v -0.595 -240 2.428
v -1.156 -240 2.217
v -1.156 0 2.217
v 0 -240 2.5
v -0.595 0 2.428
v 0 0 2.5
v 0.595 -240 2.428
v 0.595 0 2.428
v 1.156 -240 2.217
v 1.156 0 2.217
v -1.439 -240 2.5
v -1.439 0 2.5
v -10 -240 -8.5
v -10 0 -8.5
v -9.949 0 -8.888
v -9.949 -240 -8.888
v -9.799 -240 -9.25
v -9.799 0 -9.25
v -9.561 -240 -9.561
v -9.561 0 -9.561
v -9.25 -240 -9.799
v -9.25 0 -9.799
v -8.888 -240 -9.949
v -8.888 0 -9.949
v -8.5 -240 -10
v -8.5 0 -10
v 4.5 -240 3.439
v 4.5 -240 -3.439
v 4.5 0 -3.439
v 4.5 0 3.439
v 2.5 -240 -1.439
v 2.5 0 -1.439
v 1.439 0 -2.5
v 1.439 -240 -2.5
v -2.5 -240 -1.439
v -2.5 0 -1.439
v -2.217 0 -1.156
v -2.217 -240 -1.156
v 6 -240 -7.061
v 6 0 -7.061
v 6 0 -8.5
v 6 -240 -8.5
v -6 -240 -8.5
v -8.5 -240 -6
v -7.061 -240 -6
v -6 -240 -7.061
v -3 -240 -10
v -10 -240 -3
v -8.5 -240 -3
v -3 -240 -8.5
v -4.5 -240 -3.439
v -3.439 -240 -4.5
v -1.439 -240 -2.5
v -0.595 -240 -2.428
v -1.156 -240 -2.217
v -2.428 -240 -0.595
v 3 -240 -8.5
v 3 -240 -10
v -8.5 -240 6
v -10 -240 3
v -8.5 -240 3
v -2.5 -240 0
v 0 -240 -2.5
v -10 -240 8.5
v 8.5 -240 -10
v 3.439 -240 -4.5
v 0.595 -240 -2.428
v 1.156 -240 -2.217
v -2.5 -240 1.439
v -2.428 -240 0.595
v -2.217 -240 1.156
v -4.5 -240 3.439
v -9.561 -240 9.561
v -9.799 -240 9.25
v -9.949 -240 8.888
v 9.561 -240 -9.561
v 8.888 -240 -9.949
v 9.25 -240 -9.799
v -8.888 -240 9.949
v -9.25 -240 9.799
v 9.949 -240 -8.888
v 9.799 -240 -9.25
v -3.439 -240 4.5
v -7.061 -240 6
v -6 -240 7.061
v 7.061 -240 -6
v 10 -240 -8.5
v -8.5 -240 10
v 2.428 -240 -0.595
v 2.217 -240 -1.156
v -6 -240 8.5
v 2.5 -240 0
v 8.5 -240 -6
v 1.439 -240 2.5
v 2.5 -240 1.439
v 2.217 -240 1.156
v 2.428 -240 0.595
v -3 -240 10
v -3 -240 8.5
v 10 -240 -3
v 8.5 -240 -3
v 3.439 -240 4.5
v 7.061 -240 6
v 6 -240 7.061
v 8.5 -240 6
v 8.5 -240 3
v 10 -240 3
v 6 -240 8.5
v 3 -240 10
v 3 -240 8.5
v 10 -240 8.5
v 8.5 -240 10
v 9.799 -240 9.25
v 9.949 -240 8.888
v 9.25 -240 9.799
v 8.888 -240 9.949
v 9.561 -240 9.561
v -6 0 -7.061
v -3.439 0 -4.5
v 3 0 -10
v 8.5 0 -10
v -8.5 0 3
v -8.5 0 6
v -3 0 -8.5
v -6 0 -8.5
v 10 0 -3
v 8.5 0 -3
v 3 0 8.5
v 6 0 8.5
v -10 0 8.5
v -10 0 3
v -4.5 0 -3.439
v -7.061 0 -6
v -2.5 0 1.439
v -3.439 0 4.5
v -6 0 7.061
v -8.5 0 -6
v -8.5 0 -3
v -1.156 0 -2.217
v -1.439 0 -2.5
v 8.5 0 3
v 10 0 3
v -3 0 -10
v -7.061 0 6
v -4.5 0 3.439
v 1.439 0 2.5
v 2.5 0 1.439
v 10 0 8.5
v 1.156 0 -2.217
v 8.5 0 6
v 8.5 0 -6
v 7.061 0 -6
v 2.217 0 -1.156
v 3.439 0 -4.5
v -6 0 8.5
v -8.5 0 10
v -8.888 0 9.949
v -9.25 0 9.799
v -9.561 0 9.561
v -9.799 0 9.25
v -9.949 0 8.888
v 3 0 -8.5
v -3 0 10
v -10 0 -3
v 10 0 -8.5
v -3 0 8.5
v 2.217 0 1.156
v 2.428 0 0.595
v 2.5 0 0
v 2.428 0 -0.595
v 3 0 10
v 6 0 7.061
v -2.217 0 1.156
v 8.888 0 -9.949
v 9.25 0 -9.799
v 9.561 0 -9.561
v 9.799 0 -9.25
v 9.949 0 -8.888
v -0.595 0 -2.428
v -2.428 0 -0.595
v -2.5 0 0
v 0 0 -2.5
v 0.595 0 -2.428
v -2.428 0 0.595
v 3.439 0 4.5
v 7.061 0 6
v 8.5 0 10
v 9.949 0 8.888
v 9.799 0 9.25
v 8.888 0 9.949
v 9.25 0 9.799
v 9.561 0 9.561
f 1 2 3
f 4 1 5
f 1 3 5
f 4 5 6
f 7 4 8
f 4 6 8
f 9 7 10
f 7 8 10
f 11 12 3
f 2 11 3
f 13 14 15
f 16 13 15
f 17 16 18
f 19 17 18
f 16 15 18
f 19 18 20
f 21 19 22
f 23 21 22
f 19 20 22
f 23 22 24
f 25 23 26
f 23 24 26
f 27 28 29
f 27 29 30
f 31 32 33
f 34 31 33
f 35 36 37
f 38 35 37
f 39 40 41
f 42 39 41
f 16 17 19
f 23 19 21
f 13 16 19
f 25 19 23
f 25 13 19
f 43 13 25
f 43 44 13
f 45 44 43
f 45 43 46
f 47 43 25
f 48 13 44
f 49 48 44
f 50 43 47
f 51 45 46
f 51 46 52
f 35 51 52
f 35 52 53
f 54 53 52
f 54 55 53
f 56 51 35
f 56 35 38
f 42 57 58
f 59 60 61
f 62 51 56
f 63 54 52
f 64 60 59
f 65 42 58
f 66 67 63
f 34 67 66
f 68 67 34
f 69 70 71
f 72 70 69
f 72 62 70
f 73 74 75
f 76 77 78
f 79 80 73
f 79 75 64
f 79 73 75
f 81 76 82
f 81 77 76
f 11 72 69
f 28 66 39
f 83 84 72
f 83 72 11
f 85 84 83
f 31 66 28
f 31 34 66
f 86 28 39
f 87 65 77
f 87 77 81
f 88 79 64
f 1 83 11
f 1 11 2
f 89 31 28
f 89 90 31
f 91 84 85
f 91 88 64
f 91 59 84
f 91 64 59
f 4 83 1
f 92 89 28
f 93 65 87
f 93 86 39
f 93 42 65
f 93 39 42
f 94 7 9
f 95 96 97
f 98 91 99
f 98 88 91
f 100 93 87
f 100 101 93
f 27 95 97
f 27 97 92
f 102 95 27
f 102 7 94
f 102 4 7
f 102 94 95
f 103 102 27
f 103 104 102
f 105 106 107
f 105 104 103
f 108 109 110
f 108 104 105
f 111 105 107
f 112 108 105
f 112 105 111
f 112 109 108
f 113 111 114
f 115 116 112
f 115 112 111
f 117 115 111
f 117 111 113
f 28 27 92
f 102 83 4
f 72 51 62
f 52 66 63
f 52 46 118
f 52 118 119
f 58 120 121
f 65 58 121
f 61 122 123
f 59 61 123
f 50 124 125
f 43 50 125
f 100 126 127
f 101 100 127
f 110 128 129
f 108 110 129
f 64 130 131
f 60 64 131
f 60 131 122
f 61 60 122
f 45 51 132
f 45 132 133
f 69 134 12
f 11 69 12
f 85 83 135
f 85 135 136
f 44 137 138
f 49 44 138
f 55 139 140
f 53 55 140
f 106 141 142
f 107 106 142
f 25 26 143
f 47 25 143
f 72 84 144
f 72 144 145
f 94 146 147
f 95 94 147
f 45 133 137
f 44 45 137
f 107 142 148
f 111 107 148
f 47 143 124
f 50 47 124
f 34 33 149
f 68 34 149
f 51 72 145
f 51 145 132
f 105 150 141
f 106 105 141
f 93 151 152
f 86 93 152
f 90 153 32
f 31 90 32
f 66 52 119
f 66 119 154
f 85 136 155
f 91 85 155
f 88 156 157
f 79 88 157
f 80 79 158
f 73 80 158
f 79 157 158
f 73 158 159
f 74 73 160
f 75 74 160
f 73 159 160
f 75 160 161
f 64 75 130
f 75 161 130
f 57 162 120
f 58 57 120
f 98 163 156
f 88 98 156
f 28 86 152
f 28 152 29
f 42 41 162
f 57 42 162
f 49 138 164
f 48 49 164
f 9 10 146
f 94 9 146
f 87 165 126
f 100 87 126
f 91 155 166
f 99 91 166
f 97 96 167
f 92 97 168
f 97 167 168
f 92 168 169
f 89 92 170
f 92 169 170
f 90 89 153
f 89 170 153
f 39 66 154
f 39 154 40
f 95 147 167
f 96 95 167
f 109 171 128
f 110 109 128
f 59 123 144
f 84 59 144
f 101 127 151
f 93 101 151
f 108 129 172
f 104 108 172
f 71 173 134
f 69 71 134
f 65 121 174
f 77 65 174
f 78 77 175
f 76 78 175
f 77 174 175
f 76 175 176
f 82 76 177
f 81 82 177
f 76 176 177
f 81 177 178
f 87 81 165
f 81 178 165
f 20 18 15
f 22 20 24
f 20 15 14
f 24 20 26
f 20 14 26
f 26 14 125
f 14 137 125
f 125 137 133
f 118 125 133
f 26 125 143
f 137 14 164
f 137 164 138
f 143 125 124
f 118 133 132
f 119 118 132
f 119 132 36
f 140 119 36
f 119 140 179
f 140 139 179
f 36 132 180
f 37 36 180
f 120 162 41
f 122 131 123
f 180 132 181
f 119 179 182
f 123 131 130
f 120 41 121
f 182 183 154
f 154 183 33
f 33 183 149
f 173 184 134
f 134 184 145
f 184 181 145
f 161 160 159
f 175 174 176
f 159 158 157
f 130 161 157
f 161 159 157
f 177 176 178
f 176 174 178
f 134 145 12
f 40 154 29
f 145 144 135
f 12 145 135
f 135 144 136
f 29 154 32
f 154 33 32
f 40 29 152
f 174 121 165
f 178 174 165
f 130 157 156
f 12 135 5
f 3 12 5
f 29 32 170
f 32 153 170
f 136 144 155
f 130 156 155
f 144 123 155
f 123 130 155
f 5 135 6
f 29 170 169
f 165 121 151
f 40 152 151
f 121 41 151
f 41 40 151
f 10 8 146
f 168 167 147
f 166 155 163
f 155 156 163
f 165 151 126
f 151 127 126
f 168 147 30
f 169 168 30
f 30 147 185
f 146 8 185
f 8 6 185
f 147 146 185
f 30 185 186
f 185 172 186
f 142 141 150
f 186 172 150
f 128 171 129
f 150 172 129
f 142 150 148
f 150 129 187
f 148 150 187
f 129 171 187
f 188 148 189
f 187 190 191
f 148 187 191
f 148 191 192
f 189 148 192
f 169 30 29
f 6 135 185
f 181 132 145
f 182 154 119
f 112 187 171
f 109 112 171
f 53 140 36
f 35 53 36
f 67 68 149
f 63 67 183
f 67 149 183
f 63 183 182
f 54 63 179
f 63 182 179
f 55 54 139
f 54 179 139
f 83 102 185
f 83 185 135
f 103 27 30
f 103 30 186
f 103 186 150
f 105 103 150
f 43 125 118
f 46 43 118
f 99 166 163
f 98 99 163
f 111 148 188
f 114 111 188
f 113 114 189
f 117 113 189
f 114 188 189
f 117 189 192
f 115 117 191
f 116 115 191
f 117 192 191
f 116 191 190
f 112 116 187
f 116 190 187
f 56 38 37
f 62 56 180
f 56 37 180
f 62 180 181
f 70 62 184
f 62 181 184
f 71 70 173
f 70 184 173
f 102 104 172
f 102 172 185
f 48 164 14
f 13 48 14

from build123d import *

# Parameters (mm, degrees)
F1_DEPTH = 240


with BuildPart() as f1:
    # F0 (on Front) → F1 (new body)
    with BuildSketch(Plane.XZ):
        with BuildLine():
            Line((3, -10), (8.5, -10))
            ThreePointArc((8.5, -10), (9.5606601718, -9.5606601718), (10, -8.5))
            Line((10, -8.5), (10, -3))
            Line((10, -3), (8.5, -3))
            Line((8.5, -3), (8.5, -6))
            Line((8.5, -6), (7.0606601718, -6))
            Line((7.0606601718, -6), (4.5, -3.4393398282))
            Line((4.5, -3.4393398282), (4.5, 3.4393398282))
            Line((4.5, 3.4393398282), (7.0606601718, 6))
            Line((7.0606601718, 6), (8.5, 6))
            Line((8.5, 6), (8.5, 3))
            Line((8.5, 3), (10, 3))
            Line((10, 3), (10, 8.5))
            ThreePointArc((10, 8.5), (9.5606601718, 9.5606601718), (8.5, 10))
            Line((8.5, 10), (3, 10))
            Line((3, 10), (3, 8.5))
            Line((3, 8.5), (6, 8.5))
            Line((6, 8.5), (6, 7.0606601718))
            Line((6, 7.0606601718), (3.4393398282, 4.5))
            Line((3.4393398282, 4.5), (-3.4393398282, 4.5))
            Line((-3.4393398282, 4.5), (-6, 7.0606601718))
            Line((-6, 7.0606601718), (-6, 8.5))
            Line((-6, 8.5), (-3, 8.5))
            Line((-3, 8.5), (-3, 10))
            Line((-3, 10), (-8.5, 10))
            ThreePointArc((-8.5, 10), (-9.5606601718, 9.5606601718), (-10, 8.5))
            Line((-10, 8.5), (-10, 3))
            Line((-10, 3), (-8.5, 3))
            Line((-8.5, 3), (-8.5, 6))
            Line((-8.5, 6), (-7.0606601718, 6))
            Line((-7.0606601718, 6), (-4.5, 3.4393398282))
            Line((-4.5, 3.4393398282), (-4.5, -3.4393398282))
            Line((-4.5, -3.4393398282), (-7.0606601718, -6))
            Line((-7.0606601718, -6), (-8.5, -6))
            Line((-8.5, -6), (-8.5, -3))
            Line((-8.5, -3), (-10, -3))
            Line((-10, -3), (-10, -8.5))
            ThreePointArc((-10, -8.5), (-9.5606601718, -9.5606601718), (-8.5, -10))
            Line((-8.5, -10), (-3, -10))
            Line((-3, -10), (-3, -8.5))
            Line((-3, -8.5), (-6, -8.5))
            Line((-6, -8.5), (-6, -7.0606601718))
            Line((-6, -7.0606601718), (-3.4393398282, -4.5))
            Line((-3.4393398282, -4.5), (3.4393398282, -4.5))
            Line((3.4393398282, -4.5), (6, -7.0606601718))
            Line((6, -7.0606601718), (6, -8.5))
            Line((6, -8.5), (3, -8.5))
            Line((3, -8.5), (3, -10))
        make_face()
        with BuildLine():
            ThreePointArc((-1.1560121095, 2.2166722813), (0, 2.5), (1.1560121095, 2.2166722813))
            Line((1.1560121095, 2.2166722813), (1.4393398282, 2.5))
            Line((1.4393398282, 2.5), (2.5, 1.4393398282))
            Line((2.5, 1.4393398282), (2.2166722813, 1.1560121095))
            ThreePointArc((2.2166722813, 1.1560121095), (2.5, 0), (2.2166722813, -1.1560121095))
            Line((2.2166722813, -1.1560121095), (2.5, -1.4393398282))
            Line((2.5, -1.4393398282), (1.4393398282, -2.5))
            Line((1.4393398282, -2.5), (1.1560121095, -2.2166722813))
            ThreePointArc((1.1560121095, -2.2166722813), (0, -2.5), (-1.1560121095, -2.2166722813))
            Line((-1.1560121095, -2.2166722813), (-1.4393398282, -2.5))
            Line((-1.4393398282, -2.5), (-2.5, -1.4393398282))
            Line((-2.5, -1.4393398282), (-2.2166722813, -1.1560121095))
            ThreePointArc((-2.2166722813, -1.1560121095), (-2.5, 0), (-2.2166722813, 1.1560121095))
            Line((-2.2166722813, 1.1560121095), (-2.5, 1.4393398282))
            Line((-2.5, 1.4393398282), (-1.4393398282, 2.5))
            Line((-1.4393398282, 2.5), (-1.1560121095, 2.2166722813))
        make_face(mode=Mode.SUBTRACT)
    extrude(amount=F1_DEPTH)


solid = f1.part
